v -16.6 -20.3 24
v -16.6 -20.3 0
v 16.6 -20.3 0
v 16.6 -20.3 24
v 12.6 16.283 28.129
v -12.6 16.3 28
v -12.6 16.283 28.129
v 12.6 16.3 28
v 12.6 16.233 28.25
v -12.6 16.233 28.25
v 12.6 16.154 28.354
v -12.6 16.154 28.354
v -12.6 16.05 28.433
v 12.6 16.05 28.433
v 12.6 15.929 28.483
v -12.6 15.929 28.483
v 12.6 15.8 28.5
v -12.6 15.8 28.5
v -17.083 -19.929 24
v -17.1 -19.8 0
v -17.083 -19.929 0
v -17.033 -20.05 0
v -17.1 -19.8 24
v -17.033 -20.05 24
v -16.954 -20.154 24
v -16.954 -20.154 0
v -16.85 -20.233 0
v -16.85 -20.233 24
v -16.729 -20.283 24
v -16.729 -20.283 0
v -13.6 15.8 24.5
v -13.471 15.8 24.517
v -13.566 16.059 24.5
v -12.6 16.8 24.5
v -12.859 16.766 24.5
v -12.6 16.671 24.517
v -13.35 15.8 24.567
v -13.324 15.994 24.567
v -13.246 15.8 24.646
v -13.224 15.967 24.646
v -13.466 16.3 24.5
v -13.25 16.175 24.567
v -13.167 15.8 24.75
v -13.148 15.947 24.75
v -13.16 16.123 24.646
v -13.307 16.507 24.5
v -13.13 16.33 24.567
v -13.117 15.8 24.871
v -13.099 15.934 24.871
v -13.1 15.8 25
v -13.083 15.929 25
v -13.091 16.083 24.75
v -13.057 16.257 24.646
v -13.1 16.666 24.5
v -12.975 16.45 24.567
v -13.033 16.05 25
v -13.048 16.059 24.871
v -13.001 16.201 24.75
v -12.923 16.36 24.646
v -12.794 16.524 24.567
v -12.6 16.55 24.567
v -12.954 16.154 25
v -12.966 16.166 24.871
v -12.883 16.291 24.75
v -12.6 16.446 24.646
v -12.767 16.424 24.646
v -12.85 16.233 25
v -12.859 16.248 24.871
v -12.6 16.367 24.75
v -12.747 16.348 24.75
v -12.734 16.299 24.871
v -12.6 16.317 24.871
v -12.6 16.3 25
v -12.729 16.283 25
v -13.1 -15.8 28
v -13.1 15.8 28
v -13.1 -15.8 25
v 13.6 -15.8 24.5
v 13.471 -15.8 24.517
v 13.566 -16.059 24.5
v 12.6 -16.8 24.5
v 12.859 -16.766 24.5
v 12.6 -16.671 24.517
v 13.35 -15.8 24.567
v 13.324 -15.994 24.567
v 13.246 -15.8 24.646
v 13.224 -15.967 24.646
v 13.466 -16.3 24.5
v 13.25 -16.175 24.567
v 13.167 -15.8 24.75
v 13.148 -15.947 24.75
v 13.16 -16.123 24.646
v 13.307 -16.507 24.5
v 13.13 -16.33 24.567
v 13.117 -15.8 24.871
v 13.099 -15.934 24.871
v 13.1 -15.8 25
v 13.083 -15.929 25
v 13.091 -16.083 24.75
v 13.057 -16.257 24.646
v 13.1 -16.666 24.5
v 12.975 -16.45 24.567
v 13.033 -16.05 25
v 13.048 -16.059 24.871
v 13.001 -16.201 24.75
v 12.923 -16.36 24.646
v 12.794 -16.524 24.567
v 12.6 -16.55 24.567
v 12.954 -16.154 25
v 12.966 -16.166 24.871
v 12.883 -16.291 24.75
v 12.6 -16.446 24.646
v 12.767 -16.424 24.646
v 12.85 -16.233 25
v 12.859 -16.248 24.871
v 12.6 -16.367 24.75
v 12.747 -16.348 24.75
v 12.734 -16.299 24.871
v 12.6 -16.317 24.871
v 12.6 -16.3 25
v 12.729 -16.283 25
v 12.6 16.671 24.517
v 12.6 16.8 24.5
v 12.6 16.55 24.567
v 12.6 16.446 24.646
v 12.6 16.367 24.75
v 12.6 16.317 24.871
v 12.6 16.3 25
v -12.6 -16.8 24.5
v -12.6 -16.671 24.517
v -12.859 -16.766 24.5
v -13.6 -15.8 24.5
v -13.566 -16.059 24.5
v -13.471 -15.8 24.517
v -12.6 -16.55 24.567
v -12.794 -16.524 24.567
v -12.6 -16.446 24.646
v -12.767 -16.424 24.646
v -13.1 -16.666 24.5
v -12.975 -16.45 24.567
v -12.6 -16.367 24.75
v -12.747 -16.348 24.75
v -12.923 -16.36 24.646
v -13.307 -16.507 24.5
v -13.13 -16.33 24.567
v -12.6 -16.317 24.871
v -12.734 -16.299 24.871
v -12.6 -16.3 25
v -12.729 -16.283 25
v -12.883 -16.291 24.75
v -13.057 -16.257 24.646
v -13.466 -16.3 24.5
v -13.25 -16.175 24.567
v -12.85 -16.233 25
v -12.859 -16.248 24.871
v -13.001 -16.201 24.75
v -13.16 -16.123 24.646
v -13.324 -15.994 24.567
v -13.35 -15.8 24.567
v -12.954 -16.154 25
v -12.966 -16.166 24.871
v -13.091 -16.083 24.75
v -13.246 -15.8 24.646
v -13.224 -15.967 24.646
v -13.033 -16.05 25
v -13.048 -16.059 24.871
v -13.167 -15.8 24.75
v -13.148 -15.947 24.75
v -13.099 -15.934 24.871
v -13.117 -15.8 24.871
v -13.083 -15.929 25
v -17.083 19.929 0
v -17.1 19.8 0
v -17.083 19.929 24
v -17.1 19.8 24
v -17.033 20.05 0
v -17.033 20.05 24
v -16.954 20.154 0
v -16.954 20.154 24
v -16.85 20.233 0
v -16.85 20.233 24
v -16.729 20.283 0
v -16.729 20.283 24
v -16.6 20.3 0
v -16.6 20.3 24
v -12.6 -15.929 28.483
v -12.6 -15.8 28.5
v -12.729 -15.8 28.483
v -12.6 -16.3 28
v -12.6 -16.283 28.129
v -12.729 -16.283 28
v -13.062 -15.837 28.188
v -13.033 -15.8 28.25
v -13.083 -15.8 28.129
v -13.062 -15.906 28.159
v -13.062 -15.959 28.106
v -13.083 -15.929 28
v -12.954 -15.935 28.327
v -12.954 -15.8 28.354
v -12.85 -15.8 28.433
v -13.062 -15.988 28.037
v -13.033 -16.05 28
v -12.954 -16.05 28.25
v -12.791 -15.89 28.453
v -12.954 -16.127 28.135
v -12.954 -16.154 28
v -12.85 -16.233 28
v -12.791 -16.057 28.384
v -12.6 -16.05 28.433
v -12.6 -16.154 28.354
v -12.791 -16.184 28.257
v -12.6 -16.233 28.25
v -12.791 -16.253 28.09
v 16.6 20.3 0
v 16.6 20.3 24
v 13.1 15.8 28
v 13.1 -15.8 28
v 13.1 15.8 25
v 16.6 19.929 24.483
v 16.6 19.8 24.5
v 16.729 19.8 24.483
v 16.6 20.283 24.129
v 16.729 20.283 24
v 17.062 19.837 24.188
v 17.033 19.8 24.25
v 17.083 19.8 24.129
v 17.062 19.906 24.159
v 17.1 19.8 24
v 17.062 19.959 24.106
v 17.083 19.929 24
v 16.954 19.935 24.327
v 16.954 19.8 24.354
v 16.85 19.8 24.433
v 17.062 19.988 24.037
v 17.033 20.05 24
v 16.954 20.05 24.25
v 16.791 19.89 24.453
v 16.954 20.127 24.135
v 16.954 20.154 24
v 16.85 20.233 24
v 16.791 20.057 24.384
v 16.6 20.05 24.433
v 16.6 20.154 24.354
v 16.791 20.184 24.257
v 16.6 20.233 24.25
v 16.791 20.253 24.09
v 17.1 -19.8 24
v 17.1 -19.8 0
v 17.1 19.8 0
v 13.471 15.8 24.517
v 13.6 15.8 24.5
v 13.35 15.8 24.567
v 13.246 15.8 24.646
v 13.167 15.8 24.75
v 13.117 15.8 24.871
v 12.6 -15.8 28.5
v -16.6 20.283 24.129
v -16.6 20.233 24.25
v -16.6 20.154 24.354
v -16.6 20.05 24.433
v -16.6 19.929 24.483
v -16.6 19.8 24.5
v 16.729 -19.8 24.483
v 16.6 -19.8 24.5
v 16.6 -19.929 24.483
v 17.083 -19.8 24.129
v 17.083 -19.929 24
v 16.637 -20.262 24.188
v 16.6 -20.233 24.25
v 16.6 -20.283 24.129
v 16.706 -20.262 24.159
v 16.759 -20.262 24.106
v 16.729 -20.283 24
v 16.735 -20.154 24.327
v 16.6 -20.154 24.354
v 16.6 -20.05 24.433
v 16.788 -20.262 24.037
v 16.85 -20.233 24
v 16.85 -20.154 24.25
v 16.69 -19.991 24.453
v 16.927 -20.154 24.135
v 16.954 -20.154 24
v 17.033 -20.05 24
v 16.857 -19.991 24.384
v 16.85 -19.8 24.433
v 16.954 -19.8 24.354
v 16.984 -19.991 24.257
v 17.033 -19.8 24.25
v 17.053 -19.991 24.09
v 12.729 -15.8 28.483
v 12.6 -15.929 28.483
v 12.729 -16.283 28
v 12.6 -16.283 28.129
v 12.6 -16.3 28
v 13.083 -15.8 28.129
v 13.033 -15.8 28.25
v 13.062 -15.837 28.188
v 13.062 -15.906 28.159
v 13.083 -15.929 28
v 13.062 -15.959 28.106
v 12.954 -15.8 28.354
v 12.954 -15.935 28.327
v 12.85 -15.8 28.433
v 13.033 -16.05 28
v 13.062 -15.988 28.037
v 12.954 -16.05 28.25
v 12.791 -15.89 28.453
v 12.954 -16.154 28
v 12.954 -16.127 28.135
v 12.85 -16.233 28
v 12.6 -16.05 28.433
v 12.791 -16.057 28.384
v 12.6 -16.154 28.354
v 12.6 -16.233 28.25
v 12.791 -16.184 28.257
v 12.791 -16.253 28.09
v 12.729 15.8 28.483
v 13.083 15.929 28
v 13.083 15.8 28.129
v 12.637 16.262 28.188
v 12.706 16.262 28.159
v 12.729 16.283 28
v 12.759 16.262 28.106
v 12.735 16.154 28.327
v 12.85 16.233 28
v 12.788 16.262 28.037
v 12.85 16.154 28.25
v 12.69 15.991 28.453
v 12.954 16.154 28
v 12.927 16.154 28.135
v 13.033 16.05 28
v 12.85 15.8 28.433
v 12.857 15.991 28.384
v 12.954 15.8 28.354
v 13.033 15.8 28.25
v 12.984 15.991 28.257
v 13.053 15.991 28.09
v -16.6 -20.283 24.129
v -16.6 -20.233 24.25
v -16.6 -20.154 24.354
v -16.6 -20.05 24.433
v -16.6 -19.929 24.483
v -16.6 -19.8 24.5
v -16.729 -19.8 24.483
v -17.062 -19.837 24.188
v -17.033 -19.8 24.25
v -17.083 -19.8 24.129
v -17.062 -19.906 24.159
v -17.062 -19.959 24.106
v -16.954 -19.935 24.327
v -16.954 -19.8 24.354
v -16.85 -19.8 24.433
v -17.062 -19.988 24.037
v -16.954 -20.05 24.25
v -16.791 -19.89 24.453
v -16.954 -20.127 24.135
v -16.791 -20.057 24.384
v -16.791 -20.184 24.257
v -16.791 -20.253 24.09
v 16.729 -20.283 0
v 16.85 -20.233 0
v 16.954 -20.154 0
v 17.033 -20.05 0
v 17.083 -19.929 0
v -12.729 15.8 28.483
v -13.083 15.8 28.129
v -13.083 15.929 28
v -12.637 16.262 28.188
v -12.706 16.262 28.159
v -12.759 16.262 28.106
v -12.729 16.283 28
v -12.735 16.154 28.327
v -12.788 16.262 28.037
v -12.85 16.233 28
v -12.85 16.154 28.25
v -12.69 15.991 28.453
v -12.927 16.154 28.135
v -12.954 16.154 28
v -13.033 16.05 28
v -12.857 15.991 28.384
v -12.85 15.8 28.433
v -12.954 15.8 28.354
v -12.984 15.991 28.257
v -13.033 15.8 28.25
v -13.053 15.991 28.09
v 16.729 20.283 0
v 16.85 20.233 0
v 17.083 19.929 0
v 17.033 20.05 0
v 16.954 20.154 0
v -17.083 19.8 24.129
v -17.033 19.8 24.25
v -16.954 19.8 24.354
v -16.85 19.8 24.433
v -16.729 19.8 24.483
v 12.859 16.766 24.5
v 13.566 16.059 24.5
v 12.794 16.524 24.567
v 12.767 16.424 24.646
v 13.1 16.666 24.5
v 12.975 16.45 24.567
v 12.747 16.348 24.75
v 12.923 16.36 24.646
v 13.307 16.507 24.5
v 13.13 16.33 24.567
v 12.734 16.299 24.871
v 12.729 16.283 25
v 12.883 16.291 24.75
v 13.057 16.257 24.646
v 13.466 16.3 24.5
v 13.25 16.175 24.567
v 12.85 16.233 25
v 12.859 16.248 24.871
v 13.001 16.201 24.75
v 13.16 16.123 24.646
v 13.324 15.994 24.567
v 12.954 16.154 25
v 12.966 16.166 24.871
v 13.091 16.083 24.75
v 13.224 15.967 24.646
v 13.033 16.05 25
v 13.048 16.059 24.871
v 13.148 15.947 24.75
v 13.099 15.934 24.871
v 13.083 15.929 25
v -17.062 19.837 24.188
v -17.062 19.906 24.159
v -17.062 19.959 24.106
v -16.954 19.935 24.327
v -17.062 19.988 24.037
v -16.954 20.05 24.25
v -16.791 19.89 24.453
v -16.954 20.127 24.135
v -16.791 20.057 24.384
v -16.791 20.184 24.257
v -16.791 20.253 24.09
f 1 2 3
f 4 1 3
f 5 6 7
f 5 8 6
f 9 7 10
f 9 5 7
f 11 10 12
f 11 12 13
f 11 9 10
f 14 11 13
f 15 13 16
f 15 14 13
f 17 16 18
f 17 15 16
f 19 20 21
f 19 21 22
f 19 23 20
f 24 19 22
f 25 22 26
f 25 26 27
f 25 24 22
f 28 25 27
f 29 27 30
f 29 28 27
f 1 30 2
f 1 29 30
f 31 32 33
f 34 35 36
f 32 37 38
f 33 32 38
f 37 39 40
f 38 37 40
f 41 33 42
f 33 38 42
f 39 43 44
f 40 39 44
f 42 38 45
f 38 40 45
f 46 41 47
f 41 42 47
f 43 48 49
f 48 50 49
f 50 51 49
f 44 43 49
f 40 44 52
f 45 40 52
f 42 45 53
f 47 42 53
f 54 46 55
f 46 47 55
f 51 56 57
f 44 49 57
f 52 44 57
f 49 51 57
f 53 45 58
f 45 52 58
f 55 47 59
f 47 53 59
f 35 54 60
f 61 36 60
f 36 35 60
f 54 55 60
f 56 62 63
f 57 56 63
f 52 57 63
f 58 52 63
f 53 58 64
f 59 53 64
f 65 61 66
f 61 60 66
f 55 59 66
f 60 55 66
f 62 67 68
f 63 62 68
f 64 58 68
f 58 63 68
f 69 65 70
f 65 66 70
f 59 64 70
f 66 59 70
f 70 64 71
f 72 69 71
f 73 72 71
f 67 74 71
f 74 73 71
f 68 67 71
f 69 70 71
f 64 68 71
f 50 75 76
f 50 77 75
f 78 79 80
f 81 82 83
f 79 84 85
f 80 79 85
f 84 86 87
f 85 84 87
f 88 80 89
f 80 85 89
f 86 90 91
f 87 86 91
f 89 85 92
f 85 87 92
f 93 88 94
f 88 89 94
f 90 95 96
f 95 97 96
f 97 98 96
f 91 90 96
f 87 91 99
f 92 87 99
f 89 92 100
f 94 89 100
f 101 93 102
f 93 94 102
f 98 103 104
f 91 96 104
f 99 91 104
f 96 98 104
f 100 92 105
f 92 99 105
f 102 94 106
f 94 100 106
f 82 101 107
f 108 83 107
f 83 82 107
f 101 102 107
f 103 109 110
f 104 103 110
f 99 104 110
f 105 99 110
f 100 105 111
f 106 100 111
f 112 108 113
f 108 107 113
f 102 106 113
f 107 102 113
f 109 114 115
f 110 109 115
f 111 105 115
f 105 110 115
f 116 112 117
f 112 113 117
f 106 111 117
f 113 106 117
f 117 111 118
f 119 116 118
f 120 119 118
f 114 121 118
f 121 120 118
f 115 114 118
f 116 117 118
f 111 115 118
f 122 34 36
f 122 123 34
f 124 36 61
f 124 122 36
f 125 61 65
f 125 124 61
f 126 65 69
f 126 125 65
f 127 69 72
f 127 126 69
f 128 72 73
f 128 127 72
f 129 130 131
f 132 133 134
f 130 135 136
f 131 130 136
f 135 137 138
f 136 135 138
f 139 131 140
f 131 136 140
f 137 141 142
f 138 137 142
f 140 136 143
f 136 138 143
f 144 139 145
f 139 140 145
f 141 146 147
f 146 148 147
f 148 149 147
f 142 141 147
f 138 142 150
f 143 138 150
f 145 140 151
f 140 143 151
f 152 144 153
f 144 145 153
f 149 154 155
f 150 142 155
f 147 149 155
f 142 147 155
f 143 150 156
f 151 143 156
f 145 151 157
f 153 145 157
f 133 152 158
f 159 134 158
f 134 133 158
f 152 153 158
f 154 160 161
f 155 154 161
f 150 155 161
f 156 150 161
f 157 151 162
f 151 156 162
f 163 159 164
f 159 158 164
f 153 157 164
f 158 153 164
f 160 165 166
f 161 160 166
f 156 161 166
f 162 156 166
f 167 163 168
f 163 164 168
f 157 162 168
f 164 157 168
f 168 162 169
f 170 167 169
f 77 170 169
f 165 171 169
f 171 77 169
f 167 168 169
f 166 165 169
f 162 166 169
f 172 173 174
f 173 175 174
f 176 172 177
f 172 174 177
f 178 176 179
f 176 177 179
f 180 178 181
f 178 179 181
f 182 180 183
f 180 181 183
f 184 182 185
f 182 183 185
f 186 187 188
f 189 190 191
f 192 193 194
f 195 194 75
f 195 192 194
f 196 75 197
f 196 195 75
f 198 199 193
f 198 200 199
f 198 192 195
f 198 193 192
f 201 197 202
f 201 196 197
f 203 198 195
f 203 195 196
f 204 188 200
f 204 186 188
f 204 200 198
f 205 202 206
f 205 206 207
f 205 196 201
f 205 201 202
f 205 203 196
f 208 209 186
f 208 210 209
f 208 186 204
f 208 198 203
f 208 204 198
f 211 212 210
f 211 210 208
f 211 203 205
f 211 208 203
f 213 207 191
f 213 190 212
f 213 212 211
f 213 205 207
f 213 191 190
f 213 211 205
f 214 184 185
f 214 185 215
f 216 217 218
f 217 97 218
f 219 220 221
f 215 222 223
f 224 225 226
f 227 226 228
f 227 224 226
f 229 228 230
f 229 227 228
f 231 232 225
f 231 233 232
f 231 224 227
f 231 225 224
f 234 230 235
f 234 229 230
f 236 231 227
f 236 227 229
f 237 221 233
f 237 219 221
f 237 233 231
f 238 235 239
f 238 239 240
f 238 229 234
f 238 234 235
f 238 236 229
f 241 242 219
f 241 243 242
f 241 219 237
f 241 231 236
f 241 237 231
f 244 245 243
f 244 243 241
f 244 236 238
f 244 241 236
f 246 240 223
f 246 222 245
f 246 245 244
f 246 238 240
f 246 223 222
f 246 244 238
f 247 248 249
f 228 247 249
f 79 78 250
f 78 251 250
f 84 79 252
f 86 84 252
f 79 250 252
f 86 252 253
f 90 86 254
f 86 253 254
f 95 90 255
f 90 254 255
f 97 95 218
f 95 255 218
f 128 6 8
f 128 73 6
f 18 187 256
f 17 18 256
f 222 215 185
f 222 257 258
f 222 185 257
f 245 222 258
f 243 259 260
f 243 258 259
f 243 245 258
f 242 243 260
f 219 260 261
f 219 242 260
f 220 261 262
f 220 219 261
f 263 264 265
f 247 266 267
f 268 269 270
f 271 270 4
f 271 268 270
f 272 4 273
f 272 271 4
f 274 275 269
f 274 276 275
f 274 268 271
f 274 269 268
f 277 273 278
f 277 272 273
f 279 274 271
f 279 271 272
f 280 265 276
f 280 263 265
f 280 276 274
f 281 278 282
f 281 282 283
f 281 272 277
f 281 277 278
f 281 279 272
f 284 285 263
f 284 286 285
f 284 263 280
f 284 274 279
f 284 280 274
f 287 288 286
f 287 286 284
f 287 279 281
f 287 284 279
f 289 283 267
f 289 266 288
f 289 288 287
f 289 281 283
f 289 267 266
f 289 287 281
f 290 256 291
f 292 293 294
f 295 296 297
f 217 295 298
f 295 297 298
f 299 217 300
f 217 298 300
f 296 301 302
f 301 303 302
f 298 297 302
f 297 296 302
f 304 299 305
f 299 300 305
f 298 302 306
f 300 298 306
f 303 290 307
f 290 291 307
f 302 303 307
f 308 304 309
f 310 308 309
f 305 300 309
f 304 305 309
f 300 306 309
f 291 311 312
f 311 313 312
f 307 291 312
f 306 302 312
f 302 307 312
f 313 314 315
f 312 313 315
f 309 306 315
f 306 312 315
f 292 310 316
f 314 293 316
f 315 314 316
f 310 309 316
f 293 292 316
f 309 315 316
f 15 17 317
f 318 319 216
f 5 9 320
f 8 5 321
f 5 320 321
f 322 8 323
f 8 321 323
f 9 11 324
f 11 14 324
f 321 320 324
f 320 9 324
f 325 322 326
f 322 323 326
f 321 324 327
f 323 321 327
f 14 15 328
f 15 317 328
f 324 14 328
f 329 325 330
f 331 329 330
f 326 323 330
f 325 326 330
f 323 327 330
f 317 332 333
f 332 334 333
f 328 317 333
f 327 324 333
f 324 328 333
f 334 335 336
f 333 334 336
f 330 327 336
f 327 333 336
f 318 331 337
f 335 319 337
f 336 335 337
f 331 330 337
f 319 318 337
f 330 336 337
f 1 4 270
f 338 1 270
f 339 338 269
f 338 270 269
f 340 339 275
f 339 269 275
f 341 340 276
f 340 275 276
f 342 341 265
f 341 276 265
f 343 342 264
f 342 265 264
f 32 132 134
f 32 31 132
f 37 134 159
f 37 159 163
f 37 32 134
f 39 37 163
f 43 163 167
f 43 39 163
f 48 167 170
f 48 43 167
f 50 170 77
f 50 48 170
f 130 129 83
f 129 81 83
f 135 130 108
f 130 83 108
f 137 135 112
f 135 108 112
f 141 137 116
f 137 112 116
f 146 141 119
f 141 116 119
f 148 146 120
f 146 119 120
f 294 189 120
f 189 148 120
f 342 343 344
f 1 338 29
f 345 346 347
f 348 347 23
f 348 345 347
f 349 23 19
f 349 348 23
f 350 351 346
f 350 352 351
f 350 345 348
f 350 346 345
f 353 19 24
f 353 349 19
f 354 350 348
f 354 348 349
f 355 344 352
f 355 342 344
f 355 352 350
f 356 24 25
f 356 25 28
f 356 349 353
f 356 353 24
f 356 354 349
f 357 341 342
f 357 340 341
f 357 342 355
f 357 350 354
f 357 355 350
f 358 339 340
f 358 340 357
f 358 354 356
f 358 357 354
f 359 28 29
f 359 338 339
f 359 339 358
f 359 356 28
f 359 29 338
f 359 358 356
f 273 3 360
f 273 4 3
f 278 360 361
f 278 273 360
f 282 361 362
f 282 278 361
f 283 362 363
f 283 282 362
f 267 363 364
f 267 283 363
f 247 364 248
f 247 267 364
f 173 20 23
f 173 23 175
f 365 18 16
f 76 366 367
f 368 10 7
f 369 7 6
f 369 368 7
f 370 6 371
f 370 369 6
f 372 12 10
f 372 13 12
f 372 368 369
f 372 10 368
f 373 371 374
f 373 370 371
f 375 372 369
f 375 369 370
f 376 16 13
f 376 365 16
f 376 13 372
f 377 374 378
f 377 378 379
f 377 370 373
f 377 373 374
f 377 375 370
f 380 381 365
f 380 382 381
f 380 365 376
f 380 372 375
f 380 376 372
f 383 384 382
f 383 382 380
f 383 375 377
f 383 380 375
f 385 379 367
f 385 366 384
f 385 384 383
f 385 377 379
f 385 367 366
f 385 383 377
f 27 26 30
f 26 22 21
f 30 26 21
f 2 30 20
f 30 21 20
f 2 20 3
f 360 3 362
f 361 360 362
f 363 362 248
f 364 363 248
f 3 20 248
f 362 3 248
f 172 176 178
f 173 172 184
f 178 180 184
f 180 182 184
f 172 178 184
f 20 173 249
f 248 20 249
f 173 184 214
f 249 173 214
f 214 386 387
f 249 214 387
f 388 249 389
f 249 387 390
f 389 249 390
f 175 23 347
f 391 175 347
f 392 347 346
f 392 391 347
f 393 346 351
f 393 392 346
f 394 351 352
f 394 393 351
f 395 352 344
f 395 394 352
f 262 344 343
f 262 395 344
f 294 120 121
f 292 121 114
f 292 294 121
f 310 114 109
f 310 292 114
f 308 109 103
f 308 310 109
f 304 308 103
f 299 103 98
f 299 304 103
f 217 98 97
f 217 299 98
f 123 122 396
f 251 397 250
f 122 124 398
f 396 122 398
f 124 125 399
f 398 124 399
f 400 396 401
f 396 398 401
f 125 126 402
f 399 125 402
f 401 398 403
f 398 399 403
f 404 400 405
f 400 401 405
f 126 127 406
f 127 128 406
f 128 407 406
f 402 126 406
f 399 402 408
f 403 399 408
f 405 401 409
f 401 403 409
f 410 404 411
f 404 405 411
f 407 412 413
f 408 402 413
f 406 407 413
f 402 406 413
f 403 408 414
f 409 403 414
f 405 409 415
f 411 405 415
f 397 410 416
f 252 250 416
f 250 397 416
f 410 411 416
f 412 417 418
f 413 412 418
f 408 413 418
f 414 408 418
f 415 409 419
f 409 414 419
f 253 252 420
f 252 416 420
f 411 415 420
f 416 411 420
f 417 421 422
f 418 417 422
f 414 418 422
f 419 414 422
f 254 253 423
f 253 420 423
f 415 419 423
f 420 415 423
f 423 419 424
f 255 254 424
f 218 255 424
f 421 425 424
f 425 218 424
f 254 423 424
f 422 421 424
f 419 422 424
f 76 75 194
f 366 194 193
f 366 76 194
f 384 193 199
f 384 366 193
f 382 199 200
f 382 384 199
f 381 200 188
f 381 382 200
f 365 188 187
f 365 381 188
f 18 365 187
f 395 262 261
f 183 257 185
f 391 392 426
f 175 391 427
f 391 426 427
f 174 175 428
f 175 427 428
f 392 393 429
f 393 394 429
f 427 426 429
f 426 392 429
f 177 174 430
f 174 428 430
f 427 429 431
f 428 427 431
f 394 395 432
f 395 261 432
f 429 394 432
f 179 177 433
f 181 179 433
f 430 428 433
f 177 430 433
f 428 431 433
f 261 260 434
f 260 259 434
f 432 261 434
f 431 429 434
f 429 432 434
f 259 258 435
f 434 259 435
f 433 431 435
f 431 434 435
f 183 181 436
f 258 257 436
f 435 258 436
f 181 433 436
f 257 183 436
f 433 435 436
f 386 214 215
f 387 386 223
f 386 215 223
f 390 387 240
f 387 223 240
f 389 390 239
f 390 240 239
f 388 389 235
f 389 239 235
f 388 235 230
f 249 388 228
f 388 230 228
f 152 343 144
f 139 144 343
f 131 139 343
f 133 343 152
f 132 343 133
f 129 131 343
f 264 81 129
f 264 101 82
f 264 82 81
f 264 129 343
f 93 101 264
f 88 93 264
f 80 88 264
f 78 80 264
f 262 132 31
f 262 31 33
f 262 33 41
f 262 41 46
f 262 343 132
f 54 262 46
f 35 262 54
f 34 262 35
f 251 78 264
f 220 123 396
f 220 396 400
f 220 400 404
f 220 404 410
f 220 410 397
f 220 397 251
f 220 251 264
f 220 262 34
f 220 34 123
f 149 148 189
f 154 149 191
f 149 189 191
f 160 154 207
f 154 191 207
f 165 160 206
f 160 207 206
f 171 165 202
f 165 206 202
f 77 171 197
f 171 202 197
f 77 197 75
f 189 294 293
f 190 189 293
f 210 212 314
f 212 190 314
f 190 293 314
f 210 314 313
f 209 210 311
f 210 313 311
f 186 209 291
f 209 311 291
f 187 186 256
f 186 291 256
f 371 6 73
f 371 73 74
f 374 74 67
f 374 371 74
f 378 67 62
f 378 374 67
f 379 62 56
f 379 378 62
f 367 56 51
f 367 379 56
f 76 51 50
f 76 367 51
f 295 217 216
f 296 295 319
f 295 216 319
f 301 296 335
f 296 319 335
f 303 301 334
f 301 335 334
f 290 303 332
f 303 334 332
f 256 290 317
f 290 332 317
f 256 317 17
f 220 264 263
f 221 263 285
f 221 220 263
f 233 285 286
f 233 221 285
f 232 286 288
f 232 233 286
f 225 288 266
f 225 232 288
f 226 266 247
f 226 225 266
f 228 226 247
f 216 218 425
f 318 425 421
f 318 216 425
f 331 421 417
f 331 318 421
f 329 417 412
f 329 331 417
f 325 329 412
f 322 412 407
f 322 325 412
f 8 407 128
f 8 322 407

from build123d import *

# Parameters (mm, degrees)
SKETCH_W     = 34.2
SKETCH_H     = 40.6
PAD_DEPTH    = 24.5
SKETCH001_W  = 26.2
SKETCH001_H  = 32.6
PAD001_DEPTH = 4
FILLET_R     = 0.5


with BuildPart() as part:
    # Sketch → Pad (new body)
    with BuildSketch(Plane.XY):
        Rectangle(SKETCH_W, SKETCH_H)
    extrude(amount=PAD_DEPTH)

    # Sketch001 (on Face6 of Pad) → Pad001 (join)
    with BuildSketch(Plane.XY.offset(24.5)):
        Rectangle(SKETCH001_W, SKETCH001_H)
    extrude(amount=PAD001_DEPTH)

    # Fillet
    fillet_edges = [part.edges().sort_by_distance(p)[0] for p in [
        (0, -16.3, 28.5),
        (-13.1, 0, 28.5),
        (13.1, 0, 28.5),
        (0, 16.3, 28.5),
        (0, 20.3, 24.5),
        (17.1, 0, 24.5),
        (0, -20.3, 24.5),
        (-17.1, 0, 24.5),
        (-13.1, -16.3, 26.5),
        (0, -16.3, 24.5),
        (13.1, -16.3, 26.5),
        (13.1, 0, 24.5),
        (13.1, 16.3, 26.5),
        (0, 16.3, 24.5),
        (-13.1, 16.3, 26.5),
        (-13.1, 0, 24.5),
        (-17.1, 20.3, 12.25),
        (17.1, -20.3, 12.25),
        (17.1, 20.3, 12.25),
        (-17.1, -20.3, 12.25),
    ]]
    fillet(fillet_edges, radius=FILLET_R)


solid = part.part
